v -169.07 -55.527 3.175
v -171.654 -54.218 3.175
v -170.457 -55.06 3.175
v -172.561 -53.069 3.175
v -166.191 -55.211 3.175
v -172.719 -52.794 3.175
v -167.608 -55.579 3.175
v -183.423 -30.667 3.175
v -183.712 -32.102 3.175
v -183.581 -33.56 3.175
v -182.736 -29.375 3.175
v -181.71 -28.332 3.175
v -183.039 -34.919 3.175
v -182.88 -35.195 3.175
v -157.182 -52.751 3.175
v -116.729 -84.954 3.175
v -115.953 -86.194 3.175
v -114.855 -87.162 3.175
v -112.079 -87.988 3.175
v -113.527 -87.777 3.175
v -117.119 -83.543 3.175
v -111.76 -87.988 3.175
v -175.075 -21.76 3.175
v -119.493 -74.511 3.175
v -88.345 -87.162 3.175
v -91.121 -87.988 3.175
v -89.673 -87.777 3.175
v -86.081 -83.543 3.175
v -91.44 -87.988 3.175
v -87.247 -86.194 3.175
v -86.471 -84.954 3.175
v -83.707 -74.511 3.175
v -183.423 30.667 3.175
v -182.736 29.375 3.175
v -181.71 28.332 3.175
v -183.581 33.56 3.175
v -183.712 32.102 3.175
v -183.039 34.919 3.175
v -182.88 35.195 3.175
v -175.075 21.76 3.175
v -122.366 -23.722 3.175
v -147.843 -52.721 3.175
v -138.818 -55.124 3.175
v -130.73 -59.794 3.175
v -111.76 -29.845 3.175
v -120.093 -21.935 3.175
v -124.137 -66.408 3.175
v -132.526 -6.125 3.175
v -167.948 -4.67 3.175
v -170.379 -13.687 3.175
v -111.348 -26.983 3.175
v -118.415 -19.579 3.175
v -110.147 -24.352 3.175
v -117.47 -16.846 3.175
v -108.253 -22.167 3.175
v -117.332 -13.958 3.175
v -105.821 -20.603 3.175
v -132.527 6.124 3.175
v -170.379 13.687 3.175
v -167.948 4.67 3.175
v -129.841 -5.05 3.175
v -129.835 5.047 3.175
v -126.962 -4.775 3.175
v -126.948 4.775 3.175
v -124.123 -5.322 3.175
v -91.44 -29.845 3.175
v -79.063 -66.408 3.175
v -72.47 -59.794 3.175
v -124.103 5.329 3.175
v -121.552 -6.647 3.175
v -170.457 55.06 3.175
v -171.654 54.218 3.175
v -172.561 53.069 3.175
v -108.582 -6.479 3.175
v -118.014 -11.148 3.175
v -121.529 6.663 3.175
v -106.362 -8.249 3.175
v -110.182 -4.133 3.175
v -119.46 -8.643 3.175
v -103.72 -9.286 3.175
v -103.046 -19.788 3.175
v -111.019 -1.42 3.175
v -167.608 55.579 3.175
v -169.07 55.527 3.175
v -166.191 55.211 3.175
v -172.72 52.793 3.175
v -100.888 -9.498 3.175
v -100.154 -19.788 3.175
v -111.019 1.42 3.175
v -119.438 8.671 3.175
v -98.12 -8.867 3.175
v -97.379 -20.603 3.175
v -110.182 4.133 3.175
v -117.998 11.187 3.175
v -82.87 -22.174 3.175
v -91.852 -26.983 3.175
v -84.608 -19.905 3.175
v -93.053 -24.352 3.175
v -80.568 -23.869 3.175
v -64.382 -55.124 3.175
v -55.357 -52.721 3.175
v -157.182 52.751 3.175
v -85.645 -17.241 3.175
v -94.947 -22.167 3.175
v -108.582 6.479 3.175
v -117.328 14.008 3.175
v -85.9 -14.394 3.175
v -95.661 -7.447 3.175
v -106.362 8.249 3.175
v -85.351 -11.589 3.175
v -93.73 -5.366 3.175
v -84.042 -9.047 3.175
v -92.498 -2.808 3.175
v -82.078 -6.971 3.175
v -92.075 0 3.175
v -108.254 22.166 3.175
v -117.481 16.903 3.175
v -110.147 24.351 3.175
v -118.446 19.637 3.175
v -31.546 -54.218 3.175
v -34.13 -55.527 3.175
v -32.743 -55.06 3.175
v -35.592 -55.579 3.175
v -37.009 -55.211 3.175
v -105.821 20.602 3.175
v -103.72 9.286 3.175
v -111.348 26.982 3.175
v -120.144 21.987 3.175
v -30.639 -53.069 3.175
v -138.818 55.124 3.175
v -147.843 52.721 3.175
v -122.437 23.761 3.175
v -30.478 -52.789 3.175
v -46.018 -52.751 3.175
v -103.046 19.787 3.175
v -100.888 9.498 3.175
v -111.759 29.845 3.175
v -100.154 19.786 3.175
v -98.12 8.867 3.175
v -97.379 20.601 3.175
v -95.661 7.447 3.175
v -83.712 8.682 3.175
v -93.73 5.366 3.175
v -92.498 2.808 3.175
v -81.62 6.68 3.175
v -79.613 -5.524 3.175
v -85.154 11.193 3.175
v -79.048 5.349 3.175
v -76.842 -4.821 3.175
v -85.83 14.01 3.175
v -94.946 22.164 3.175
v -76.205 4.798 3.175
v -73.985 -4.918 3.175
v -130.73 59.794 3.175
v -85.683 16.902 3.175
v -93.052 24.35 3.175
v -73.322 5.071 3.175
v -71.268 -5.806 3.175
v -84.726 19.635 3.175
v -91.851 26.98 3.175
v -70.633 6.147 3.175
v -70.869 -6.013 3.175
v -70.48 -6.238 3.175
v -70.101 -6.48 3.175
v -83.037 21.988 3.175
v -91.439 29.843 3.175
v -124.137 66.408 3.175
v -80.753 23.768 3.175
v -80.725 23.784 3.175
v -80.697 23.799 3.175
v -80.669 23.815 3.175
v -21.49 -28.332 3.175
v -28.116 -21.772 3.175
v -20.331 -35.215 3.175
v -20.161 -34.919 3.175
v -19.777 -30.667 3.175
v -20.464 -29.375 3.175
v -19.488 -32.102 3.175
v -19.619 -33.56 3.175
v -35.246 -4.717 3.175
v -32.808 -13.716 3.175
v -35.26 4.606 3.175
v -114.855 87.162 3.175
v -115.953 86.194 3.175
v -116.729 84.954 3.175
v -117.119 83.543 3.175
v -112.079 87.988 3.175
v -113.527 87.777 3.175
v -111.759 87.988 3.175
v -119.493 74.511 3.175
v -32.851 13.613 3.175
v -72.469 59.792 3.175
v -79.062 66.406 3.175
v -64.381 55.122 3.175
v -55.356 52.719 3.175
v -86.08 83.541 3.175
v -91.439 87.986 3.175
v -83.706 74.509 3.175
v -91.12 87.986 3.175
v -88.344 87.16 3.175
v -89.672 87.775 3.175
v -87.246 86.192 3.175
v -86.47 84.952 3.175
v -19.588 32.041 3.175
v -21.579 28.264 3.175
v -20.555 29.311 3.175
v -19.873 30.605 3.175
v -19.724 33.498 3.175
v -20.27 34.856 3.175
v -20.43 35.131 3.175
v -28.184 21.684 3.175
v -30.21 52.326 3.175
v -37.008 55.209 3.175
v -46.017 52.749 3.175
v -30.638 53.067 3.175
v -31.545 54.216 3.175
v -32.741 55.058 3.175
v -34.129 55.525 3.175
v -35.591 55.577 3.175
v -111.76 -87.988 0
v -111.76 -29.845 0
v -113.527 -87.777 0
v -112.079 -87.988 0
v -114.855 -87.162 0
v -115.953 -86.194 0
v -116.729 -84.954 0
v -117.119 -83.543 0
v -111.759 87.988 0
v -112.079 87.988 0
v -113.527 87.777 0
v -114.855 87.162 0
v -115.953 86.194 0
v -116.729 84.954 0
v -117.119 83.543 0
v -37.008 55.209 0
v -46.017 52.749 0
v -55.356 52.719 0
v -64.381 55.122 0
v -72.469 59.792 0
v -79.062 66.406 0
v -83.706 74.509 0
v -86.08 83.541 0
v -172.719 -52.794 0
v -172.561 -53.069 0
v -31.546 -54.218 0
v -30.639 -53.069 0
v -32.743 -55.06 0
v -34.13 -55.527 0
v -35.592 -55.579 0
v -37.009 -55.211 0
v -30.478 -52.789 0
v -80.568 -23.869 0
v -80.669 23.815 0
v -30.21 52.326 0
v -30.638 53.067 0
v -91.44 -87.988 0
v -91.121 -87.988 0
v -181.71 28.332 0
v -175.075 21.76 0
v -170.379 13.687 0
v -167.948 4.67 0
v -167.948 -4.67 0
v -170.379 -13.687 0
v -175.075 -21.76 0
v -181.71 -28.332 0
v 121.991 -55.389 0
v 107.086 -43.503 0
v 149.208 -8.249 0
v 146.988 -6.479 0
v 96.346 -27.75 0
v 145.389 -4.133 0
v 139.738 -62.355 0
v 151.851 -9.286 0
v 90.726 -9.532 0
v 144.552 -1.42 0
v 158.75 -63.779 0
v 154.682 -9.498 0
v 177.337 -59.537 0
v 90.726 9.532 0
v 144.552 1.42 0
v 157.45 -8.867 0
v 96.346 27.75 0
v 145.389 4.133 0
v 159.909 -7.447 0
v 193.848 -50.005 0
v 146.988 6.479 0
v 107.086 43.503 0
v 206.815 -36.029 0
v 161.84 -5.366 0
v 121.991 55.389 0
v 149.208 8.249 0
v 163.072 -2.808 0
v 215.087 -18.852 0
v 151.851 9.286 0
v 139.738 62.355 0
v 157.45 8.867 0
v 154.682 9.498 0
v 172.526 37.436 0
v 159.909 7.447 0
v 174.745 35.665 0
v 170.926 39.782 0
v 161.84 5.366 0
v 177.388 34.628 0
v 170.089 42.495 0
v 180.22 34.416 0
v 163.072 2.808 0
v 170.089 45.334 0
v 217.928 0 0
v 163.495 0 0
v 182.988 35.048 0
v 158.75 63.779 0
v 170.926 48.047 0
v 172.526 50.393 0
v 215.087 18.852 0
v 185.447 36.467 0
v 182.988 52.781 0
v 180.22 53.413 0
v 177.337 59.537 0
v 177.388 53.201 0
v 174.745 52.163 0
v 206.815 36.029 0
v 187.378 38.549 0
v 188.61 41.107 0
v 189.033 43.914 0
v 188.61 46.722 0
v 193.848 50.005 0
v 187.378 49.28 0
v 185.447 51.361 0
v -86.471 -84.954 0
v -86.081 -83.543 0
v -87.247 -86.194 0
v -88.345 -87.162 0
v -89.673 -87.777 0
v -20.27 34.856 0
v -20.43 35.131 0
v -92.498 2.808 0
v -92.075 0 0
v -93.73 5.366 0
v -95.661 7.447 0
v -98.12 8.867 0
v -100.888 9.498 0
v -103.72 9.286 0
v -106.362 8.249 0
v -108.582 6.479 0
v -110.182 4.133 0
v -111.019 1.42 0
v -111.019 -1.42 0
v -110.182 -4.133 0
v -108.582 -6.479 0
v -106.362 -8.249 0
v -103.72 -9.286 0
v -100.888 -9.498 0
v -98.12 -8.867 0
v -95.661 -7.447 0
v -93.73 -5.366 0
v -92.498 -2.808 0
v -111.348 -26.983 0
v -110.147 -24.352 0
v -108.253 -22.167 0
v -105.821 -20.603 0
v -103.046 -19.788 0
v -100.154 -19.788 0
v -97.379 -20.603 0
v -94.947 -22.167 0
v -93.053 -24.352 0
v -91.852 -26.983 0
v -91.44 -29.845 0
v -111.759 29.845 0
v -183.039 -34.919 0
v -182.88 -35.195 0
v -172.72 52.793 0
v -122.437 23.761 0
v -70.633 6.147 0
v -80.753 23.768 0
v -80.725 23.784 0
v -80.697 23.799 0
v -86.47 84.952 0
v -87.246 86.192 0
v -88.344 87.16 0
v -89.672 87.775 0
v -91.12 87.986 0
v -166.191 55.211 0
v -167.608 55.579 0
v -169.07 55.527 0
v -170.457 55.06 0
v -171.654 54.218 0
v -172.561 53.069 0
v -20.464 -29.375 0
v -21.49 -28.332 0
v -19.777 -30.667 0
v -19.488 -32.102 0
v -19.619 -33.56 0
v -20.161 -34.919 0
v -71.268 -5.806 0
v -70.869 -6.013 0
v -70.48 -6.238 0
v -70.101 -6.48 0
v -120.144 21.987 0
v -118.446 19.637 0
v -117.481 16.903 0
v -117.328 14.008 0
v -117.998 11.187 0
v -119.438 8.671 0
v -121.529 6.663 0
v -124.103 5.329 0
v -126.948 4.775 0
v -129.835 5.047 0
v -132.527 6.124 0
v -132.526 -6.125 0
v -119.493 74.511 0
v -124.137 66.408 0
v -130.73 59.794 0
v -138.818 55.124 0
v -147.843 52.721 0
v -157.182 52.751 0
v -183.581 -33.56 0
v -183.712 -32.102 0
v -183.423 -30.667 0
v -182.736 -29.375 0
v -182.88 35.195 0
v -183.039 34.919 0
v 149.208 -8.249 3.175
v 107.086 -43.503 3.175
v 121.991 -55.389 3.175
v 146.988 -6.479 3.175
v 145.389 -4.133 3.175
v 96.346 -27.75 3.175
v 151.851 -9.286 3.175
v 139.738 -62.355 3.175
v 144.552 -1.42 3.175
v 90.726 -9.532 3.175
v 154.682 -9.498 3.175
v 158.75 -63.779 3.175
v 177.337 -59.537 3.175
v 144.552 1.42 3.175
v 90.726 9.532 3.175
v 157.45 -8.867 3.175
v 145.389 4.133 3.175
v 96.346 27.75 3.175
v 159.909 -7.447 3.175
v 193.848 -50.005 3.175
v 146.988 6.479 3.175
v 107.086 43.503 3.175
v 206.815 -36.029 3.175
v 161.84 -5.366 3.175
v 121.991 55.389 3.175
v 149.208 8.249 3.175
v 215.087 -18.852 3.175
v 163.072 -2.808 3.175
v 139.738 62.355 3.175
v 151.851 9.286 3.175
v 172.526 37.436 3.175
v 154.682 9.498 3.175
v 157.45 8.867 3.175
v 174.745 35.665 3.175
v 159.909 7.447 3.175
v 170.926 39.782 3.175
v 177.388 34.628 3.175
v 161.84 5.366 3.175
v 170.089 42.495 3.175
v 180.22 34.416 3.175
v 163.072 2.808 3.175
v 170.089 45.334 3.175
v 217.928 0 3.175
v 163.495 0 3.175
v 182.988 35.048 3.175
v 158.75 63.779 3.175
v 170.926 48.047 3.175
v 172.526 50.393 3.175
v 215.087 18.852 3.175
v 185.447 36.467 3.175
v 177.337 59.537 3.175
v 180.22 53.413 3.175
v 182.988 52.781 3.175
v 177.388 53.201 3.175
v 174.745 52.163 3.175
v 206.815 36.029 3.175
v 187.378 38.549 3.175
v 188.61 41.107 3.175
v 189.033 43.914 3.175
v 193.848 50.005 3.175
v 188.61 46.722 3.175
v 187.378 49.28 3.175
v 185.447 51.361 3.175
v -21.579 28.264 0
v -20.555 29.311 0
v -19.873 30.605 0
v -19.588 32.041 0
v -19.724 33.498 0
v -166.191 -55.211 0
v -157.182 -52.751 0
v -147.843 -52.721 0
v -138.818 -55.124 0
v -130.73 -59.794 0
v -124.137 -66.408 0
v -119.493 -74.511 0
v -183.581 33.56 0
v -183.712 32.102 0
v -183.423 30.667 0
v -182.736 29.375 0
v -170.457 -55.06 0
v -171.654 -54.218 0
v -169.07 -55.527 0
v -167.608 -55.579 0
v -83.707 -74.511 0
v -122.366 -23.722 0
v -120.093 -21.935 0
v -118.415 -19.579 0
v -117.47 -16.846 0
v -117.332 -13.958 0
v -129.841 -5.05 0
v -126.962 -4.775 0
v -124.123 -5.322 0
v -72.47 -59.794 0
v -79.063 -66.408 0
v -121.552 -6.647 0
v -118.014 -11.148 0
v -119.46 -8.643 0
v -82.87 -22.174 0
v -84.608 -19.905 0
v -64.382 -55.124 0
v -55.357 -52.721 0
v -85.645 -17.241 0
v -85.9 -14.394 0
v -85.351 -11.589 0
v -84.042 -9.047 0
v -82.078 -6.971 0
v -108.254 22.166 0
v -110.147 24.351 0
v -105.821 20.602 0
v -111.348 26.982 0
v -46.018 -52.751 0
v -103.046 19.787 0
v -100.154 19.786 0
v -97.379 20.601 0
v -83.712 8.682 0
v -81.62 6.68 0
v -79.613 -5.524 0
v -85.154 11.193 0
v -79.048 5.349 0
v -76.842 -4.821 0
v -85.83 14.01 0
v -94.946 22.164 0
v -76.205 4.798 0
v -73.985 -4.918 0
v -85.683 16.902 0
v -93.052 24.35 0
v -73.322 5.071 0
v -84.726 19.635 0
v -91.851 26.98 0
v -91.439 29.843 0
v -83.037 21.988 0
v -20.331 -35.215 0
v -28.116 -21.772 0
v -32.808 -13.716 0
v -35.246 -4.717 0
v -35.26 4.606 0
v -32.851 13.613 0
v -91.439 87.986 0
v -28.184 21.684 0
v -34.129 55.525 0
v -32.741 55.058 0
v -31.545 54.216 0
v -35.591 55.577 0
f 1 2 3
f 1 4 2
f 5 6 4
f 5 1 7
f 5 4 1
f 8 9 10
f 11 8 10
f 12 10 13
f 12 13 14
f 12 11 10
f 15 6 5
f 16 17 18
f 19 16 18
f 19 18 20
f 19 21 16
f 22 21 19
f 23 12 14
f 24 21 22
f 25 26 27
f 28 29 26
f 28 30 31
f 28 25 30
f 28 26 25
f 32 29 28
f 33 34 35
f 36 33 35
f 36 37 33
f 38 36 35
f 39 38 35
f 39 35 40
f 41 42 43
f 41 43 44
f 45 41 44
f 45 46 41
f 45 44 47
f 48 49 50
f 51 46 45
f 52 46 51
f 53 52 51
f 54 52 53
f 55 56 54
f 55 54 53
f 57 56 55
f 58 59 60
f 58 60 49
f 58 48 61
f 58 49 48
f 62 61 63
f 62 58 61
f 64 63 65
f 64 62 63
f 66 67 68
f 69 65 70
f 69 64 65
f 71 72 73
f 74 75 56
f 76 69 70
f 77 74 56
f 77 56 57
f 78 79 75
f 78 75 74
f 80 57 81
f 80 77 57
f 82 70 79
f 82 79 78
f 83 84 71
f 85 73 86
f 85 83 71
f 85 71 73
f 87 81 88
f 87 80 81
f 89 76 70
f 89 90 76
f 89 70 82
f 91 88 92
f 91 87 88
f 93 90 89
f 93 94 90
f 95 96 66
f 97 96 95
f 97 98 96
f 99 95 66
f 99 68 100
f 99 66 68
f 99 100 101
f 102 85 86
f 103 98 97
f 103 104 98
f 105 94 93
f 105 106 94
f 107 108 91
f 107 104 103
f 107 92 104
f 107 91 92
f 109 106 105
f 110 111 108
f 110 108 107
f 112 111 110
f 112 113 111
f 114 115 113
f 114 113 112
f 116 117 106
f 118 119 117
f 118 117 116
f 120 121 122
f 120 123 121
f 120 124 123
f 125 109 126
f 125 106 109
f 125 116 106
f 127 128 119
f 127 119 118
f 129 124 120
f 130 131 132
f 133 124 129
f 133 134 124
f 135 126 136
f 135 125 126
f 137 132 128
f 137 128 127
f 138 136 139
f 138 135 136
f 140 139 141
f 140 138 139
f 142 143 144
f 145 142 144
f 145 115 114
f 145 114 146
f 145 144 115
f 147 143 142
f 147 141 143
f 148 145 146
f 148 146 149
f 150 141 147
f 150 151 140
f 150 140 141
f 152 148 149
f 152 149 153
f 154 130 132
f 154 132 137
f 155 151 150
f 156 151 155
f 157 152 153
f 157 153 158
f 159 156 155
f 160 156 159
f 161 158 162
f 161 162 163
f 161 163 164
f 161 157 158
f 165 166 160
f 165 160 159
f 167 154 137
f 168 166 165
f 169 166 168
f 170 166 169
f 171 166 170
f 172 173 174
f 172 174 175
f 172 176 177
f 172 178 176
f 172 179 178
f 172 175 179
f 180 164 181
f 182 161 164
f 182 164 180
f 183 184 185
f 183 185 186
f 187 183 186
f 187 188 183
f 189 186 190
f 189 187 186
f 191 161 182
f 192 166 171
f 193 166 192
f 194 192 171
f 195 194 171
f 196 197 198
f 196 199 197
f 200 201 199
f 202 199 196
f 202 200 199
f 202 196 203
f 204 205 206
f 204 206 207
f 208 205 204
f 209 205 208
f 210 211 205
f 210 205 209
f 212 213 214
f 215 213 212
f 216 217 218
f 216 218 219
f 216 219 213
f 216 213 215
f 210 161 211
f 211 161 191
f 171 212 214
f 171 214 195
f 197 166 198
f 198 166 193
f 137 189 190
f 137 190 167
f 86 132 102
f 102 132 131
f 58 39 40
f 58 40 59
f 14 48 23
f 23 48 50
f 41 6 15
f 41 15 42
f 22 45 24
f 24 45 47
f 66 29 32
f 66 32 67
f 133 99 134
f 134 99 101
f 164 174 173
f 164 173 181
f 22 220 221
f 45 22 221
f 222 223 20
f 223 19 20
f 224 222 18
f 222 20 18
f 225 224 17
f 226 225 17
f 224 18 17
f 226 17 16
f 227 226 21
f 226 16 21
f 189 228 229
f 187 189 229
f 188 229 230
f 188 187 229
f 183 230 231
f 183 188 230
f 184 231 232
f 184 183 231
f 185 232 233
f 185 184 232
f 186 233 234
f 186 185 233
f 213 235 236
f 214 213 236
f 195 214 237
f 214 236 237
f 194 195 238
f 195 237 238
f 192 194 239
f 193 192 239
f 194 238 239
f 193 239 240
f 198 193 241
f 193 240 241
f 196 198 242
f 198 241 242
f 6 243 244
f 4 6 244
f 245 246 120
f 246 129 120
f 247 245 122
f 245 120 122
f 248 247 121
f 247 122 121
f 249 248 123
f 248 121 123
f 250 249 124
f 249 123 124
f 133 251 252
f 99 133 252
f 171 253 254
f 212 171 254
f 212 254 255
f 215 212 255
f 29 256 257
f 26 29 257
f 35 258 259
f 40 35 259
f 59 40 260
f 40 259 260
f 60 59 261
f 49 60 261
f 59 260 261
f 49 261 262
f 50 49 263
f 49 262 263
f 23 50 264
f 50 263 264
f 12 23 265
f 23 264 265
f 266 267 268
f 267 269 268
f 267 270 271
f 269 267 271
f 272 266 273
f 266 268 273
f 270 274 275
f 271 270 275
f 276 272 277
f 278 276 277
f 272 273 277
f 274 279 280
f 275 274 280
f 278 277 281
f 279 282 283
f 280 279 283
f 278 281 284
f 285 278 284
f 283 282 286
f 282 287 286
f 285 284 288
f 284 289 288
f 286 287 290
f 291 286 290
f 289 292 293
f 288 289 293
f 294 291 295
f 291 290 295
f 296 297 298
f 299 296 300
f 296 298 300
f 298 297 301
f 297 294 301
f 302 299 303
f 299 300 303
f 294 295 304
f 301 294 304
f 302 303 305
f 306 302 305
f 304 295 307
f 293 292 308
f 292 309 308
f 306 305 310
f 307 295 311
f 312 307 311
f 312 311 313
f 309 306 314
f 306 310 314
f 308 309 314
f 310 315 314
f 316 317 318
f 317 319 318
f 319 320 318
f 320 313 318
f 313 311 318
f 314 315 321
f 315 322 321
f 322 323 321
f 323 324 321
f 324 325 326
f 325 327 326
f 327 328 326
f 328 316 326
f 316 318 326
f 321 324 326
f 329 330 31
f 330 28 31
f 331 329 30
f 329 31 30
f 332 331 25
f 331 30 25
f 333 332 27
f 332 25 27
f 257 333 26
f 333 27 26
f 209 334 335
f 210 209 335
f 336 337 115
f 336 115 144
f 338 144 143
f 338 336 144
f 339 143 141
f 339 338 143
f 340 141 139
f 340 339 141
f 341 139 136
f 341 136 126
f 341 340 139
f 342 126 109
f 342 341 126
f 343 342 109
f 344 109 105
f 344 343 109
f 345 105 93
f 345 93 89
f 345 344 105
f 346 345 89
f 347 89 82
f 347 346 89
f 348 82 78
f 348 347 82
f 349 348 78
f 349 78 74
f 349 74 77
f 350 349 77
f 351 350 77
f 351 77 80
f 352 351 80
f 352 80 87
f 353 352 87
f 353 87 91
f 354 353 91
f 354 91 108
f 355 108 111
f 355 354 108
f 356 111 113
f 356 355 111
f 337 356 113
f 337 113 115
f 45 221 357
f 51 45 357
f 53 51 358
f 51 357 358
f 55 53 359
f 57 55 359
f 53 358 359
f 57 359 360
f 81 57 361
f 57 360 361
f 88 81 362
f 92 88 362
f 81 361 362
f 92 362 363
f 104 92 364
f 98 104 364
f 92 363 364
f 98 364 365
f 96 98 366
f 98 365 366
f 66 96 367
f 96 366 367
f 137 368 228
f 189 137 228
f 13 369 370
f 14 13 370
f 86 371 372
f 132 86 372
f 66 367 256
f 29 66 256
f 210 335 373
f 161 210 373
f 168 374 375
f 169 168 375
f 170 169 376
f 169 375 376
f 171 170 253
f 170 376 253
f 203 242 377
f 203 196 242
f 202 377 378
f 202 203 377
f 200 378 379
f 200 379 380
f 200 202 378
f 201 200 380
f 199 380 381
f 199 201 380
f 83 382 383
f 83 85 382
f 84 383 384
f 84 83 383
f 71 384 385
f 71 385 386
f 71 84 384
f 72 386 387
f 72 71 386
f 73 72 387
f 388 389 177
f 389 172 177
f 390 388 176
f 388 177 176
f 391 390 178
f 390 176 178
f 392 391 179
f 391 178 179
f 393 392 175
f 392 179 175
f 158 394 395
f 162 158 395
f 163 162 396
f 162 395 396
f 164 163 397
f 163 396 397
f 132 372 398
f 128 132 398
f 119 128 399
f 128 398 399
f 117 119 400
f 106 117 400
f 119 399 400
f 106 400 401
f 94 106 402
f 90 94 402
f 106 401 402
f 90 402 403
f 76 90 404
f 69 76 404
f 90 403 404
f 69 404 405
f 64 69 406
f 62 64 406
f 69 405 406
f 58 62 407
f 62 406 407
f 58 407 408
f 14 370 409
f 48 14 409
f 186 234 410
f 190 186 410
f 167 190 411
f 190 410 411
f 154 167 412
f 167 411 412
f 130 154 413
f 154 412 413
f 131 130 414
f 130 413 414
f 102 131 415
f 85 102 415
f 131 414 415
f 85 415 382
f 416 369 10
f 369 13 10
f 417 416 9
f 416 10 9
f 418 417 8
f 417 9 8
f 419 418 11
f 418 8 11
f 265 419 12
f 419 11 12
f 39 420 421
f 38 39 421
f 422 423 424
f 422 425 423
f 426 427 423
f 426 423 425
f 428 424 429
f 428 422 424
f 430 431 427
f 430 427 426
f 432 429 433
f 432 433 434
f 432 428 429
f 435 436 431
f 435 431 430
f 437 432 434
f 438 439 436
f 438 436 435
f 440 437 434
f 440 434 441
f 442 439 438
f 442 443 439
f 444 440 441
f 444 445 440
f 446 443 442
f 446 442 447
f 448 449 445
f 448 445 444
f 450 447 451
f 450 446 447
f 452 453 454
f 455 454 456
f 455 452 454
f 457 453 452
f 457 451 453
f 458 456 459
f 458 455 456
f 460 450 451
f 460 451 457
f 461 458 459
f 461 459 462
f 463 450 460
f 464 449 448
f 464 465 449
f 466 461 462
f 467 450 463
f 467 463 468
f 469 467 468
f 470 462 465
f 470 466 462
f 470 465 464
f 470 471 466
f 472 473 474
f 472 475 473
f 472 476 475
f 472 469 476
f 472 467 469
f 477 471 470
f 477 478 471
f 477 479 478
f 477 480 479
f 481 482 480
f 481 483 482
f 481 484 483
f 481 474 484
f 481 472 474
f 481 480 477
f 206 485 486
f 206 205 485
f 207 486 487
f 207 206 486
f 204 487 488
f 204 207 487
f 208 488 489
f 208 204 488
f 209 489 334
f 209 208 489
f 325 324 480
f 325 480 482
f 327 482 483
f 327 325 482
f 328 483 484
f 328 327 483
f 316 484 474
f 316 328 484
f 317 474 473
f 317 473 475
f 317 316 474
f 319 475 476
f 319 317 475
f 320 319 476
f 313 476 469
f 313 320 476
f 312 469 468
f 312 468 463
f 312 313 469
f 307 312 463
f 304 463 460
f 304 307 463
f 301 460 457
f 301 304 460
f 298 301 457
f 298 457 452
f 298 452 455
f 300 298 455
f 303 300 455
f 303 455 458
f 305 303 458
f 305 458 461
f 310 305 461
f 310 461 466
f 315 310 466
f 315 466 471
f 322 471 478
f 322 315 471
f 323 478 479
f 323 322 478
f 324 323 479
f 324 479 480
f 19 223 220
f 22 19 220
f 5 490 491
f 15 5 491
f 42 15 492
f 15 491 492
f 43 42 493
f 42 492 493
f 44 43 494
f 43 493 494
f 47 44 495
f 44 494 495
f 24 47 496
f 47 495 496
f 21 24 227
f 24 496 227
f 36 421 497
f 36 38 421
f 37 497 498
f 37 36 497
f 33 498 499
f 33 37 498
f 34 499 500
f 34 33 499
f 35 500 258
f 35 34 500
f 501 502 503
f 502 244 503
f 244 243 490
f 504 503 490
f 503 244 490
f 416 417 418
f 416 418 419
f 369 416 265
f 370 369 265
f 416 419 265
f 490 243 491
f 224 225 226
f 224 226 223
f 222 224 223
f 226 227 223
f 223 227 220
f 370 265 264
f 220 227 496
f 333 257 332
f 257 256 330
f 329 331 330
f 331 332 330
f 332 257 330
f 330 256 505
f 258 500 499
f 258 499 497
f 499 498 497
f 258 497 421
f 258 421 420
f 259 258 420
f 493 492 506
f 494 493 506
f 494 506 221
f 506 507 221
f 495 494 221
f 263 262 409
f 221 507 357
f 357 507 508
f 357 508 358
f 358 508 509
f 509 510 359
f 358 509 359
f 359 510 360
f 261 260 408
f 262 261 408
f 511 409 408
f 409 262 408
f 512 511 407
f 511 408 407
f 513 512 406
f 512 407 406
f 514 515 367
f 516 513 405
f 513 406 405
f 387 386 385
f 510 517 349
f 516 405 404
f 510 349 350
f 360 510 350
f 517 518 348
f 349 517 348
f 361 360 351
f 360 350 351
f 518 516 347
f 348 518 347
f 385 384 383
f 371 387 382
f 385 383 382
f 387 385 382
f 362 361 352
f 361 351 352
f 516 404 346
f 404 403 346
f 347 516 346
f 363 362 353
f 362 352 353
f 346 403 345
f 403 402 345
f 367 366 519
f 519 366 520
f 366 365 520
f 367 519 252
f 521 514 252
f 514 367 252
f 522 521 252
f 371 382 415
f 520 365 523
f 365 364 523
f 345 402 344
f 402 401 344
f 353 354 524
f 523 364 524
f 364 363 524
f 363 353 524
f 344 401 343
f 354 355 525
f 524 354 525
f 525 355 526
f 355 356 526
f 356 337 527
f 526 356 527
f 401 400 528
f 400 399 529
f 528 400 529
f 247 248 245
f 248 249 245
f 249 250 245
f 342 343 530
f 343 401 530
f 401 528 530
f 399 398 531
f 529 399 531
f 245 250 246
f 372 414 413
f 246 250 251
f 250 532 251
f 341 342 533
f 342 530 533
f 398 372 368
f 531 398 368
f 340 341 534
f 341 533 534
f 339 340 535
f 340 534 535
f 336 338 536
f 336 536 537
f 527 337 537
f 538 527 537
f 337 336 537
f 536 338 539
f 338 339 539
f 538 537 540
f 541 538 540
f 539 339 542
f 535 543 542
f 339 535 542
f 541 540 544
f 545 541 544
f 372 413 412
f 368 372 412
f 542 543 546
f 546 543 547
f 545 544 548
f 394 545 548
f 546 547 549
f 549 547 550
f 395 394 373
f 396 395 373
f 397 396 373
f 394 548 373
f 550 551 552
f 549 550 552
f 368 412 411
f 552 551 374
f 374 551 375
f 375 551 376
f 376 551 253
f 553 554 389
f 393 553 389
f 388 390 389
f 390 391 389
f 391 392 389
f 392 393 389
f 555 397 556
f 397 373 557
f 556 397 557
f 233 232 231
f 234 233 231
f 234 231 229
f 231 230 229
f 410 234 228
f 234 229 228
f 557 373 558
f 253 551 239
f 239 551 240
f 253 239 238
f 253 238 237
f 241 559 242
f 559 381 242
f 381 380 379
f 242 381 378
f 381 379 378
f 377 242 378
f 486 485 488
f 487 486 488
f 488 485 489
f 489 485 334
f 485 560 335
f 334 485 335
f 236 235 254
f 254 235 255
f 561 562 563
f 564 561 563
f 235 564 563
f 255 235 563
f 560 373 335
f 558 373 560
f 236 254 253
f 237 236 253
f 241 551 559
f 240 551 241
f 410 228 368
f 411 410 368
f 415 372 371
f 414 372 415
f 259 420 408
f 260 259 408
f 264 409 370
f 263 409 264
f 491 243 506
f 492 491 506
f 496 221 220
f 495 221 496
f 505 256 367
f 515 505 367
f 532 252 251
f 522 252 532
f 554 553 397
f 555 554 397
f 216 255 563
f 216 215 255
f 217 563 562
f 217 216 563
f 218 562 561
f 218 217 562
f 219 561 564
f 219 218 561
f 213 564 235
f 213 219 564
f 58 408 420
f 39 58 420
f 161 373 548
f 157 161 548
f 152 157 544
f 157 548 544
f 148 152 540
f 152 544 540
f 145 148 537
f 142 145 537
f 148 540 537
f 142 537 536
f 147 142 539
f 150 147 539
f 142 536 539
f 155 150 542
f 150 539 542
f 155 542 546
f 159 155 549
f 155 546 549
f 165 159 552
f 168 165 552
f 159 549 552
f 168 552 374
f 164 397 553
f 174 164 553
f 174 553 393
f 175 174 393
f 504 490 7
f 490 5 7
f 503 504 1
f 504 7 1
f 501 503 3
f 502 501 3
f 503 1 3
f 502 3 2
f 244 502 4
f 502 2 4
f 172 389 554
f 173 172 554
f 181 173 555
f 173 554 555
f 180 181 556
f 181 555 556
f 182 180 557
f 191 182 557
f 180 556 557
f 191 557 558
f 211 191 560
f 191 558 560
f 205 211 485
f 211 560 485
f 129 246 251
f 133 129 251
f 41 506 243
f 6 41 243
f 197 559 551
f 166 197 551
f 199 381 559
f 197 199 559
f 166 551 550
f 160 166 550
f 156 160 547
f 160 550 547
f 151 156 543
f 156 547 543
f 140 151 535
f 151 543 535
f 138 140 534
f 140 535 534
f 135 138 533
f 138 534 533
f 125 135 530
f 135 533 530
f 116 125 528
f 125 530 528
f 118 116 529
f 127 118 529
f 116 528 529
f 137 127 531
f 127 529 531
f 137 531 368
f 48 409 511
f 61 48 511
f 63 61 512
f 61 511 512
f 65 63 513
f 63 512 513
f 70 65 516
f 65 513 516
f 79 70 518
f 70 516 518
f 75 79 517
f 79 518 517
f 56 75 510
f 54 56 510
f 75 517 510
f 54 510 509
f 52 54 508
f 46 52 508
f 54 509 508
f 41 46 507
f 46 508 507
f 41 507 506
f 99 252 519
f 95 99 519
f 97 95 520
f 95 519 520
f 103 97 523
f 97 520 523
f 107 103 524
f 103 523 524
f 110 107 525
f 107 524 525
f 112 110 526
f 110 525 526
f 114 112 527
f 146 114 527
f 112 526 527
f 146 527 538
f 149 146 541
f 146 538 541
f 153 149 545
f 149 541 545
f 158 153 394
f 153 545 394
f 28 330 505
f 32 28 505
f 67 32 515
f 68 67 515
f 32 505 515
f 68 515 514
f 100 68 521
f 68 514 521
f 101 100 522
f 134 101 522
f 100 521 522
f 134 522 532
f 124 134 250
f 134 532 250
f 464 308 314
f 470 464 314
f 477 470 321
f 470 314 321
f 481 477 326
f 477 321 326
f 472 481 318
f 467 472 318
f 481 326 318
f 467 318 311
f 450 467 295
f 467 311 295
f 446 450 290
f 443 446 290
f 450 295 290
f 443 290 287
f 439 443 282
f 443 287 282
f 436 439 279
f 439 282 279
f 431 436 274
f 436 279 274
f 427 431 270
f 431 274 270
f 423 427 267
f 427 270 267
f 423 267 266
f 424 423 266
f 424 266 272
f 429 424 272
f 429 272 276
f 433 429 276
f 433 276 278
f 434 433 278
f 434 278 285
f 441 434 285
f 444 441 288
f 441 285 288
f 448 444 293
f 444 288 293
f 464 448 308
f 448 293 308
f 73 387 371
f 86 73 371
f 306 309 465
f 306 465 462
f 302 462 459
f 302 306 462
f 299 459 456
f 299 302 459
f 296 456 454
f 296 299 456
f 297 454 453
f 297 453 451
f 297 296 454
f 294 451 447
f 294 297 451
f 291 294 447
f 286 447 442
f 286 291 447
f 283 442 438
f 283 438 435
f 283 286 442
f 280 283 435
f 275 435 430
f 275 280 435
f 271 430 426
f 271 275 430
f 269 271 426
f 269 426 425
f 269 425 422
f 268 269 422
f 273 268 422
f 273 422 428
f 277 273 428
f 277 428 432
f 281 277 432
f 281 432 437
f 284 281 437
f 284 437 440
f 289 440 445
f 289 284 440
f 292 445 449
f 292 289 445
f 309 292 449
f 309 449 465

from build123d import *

# Parameters (mm, degrees)
F0_R     = 9.525
F1_DEPTH = 3.175
F2_R     = 5.08
F0_R_2   = 63.9582216699
F0_R_3   = 33.02
F3_DEPTH = 3.175


# Not quite as in the source:
# - a length typed as a fraction of an inch, garbled in the dataset ("3 / 203.2 mm" for 3/8 in), is restored
# - a feature names something its author has since deleted; it is built from what else it names


with BuildPart() as f1:
    # F0 (on Top) → F1 (new body)
    with BuildSketch(Plane.XY):
        with BuildLine():
            ThreePointArc((-17.78, -30.7958633586), (-35.5599563921, -0.0556901267), (-17.8763707949, 30.7400222382))
            Line((-17.8763707949, 30.7400222382), (-20.4296415334, 35.1306001794))
            Line((-20.4296415334, 35.1306001794), (-70.6329627114, 6.1469720917))
            ThreePointArc((-70.6329627114, 6.1469720917), (-84.5232381264, 9.8860746707), (-80.7525608015, 23.7678120156))
            ThreePointArc((-80.7525608015, 23.7678120156), (-80.7108842522, 23.7914906594), (-80.6690964546, 23.8149724163))
            Line((-80.6690964546, 23.8149724163), (-30.2104125797, 52.3259695061))
            Line((-30.2104125797, 52.3259695061), (-33.0188105519, 57.1902574851))
            ThreePointArc((-33.0188105519, 57.1902574851), (-68.5788105527, 57.1902574837), (-86.3588105535, 87.9861208428))
            Line((-86.3588105535, 87.9861208428), (-91.4394053355, 87.9861208428))
            Line((-91.4394053355, 87.9861208428), (-91.4394053355, 29.8429398183))
            ThreePointArc((-91.4394053355, 29.8429398183), (-101.6004354264, 19.6829398705), (-111.7594051266, 29.845))
            Line((-111.7594051266, 29.845), (-111.7594051266, 87.9881810245))
            Line((-111.7594051266, 87.9881810245), (-116.84, 87.9881810245))
            ThreePointArc((-116.84, 87.9881810245), (-134.62, 57.1923176659), (-170.18, 57.1923176659))
            Line((-170.18, 57.1923176659), (-172.7201599914, 52.7926315014))
            Line((-172.7201599914, 52.7926315014), (-122.4365198362, 23.7613583219))
            ThreePointArc((-122.4365198362, 23.7613583219), (-118.627620527, 9.8774561073), (-132.5265281759, 6.1236818976))
            Line((-132.5265281759, 6.1236818976), (-182.88, 35.1952724098))
            Line((-182.88, 35.1952724098), (-185.42, 30.7958633586))
            ThreePointArc((-185.42, 30.7958633586), (-167.64, 0), (-185.42, -30.7958633586))
            Line((-185.42, -30.7958633586), (-182.8800000009, -35.1952724082))
            Line((-182.8800000009, -35.1952724082), (-132.5258080212, -6.1245428478))
            ThreePointArc((-132.5258080212, -6.1245428478), (-118.6470606402, -9.8436248763), (-122.3661426686, -23.7223722573))
            Line((-122.3661426686, -23.7223722573), (-172.7194471607, -52.7938661604))
            Line((-172.7194471607, -52.7938661604), (-170.18, -57.1923176659))
            ThreePointArc((-170.18, -57.1923176659), (-134.62, -57.1923176659), (-116.84, -87.9881810245))
            Line((-116.84, -87.9881810245), (-111.76, -87.9881810245))
            Line((-111.76, -87.9881810245), (-111.76, -29.845))
            ThreePointArc((-111.76, -29.845), (-101.6, -19.685), (-91.44, -29.845))
            Line((-91.44, -29.845), (-91.4399999997, -87.9881810245))
            Line((-91.4399999997, -87.9881810245), (-86.36, -87.9881810245))
            ThreePointArc((-86.36, -87.9881810245), (-68.58, -57.1923176659), (-33.02, -57.1923176659))
            Line((-33.02, -57.1923176659), (-30.4777274407, -52.7889724266))
            Line((-30.4777274407, -52.7889724266), (-80.5680413022, -23.8693162349))
            ThreePointArc((-80.5680413022, -23.8693162349), (-84.7865541797, -10.2717986383), (-71.2681836795, -5.8061525812))
            ThreePointArc((-71.2681836795, -5.8061525812), (-70.6734718241, -6.1236818976), (-70.1011274419, -6.4799528141))
            Line((-70.1011274419, -6.4799528141), (-20.3311837367, -35.2146432099))
            Line((-20.3311837367, -35.2146432099), (-17.78, -30.7958633586))
        make_face()
        with Locations((-101.6, 0)):
            Circle(F0_R, mode=Mode.SUBTRACT)
    extrude(amount=F1_DEPTH)

    # F2
    f2_edges = [f1.edges().sort_by_distance(p)[0] for p in [
        (-17.876371, 30.740022, 1.5875),
        (-17.78, -30.795863, 1.5875),
        (-33.02, -57.192318, 1.5875),
        (-86.36, -87.988181, 1.5875),
        (-116.84, -87.988181, 1.5875),
        (-170.18, -57.192318, 1.5875),
        (-185.42, -30.795863, 1.5875),
        (-185.42, 30.795863, 1.5875),
        (-116.84, 87.988181, 1.5875),
        (-86.358811, 87.986121, 1.5875),
        (-33.018811, 57.190257, 1.5875),
        (-170.18, 57.192318, 1.5875),
    ]]
    fillet(f2_edges, radius=F2_R)


with BuildPart() as f3:
    # F0 (on Top) → F3 (new body)
    with BuildSketch(Plane.XY):
        with Locations((153.9702564478, 0)):
            Circle(F0_R_2)
        with Locations((153.9702564478, 0)):
            Circle(F0_R_3, mode=Mode.SUBTRACT)
        with Locations((179.5079290119, 43.9143174831)):
            Circle(F0_R, mode=Mode.SUBTRACT)
        with Locations((153.9702564478, 0)):
            Circle(F0_R_3)
        with Locations((153.9702564478, 0)):
            Circle(F0_R, mode=Mode.SUBTRACT)
    extrude(amount=F3_DEPTH)


solid = Compound([f1.part, f3.part])
